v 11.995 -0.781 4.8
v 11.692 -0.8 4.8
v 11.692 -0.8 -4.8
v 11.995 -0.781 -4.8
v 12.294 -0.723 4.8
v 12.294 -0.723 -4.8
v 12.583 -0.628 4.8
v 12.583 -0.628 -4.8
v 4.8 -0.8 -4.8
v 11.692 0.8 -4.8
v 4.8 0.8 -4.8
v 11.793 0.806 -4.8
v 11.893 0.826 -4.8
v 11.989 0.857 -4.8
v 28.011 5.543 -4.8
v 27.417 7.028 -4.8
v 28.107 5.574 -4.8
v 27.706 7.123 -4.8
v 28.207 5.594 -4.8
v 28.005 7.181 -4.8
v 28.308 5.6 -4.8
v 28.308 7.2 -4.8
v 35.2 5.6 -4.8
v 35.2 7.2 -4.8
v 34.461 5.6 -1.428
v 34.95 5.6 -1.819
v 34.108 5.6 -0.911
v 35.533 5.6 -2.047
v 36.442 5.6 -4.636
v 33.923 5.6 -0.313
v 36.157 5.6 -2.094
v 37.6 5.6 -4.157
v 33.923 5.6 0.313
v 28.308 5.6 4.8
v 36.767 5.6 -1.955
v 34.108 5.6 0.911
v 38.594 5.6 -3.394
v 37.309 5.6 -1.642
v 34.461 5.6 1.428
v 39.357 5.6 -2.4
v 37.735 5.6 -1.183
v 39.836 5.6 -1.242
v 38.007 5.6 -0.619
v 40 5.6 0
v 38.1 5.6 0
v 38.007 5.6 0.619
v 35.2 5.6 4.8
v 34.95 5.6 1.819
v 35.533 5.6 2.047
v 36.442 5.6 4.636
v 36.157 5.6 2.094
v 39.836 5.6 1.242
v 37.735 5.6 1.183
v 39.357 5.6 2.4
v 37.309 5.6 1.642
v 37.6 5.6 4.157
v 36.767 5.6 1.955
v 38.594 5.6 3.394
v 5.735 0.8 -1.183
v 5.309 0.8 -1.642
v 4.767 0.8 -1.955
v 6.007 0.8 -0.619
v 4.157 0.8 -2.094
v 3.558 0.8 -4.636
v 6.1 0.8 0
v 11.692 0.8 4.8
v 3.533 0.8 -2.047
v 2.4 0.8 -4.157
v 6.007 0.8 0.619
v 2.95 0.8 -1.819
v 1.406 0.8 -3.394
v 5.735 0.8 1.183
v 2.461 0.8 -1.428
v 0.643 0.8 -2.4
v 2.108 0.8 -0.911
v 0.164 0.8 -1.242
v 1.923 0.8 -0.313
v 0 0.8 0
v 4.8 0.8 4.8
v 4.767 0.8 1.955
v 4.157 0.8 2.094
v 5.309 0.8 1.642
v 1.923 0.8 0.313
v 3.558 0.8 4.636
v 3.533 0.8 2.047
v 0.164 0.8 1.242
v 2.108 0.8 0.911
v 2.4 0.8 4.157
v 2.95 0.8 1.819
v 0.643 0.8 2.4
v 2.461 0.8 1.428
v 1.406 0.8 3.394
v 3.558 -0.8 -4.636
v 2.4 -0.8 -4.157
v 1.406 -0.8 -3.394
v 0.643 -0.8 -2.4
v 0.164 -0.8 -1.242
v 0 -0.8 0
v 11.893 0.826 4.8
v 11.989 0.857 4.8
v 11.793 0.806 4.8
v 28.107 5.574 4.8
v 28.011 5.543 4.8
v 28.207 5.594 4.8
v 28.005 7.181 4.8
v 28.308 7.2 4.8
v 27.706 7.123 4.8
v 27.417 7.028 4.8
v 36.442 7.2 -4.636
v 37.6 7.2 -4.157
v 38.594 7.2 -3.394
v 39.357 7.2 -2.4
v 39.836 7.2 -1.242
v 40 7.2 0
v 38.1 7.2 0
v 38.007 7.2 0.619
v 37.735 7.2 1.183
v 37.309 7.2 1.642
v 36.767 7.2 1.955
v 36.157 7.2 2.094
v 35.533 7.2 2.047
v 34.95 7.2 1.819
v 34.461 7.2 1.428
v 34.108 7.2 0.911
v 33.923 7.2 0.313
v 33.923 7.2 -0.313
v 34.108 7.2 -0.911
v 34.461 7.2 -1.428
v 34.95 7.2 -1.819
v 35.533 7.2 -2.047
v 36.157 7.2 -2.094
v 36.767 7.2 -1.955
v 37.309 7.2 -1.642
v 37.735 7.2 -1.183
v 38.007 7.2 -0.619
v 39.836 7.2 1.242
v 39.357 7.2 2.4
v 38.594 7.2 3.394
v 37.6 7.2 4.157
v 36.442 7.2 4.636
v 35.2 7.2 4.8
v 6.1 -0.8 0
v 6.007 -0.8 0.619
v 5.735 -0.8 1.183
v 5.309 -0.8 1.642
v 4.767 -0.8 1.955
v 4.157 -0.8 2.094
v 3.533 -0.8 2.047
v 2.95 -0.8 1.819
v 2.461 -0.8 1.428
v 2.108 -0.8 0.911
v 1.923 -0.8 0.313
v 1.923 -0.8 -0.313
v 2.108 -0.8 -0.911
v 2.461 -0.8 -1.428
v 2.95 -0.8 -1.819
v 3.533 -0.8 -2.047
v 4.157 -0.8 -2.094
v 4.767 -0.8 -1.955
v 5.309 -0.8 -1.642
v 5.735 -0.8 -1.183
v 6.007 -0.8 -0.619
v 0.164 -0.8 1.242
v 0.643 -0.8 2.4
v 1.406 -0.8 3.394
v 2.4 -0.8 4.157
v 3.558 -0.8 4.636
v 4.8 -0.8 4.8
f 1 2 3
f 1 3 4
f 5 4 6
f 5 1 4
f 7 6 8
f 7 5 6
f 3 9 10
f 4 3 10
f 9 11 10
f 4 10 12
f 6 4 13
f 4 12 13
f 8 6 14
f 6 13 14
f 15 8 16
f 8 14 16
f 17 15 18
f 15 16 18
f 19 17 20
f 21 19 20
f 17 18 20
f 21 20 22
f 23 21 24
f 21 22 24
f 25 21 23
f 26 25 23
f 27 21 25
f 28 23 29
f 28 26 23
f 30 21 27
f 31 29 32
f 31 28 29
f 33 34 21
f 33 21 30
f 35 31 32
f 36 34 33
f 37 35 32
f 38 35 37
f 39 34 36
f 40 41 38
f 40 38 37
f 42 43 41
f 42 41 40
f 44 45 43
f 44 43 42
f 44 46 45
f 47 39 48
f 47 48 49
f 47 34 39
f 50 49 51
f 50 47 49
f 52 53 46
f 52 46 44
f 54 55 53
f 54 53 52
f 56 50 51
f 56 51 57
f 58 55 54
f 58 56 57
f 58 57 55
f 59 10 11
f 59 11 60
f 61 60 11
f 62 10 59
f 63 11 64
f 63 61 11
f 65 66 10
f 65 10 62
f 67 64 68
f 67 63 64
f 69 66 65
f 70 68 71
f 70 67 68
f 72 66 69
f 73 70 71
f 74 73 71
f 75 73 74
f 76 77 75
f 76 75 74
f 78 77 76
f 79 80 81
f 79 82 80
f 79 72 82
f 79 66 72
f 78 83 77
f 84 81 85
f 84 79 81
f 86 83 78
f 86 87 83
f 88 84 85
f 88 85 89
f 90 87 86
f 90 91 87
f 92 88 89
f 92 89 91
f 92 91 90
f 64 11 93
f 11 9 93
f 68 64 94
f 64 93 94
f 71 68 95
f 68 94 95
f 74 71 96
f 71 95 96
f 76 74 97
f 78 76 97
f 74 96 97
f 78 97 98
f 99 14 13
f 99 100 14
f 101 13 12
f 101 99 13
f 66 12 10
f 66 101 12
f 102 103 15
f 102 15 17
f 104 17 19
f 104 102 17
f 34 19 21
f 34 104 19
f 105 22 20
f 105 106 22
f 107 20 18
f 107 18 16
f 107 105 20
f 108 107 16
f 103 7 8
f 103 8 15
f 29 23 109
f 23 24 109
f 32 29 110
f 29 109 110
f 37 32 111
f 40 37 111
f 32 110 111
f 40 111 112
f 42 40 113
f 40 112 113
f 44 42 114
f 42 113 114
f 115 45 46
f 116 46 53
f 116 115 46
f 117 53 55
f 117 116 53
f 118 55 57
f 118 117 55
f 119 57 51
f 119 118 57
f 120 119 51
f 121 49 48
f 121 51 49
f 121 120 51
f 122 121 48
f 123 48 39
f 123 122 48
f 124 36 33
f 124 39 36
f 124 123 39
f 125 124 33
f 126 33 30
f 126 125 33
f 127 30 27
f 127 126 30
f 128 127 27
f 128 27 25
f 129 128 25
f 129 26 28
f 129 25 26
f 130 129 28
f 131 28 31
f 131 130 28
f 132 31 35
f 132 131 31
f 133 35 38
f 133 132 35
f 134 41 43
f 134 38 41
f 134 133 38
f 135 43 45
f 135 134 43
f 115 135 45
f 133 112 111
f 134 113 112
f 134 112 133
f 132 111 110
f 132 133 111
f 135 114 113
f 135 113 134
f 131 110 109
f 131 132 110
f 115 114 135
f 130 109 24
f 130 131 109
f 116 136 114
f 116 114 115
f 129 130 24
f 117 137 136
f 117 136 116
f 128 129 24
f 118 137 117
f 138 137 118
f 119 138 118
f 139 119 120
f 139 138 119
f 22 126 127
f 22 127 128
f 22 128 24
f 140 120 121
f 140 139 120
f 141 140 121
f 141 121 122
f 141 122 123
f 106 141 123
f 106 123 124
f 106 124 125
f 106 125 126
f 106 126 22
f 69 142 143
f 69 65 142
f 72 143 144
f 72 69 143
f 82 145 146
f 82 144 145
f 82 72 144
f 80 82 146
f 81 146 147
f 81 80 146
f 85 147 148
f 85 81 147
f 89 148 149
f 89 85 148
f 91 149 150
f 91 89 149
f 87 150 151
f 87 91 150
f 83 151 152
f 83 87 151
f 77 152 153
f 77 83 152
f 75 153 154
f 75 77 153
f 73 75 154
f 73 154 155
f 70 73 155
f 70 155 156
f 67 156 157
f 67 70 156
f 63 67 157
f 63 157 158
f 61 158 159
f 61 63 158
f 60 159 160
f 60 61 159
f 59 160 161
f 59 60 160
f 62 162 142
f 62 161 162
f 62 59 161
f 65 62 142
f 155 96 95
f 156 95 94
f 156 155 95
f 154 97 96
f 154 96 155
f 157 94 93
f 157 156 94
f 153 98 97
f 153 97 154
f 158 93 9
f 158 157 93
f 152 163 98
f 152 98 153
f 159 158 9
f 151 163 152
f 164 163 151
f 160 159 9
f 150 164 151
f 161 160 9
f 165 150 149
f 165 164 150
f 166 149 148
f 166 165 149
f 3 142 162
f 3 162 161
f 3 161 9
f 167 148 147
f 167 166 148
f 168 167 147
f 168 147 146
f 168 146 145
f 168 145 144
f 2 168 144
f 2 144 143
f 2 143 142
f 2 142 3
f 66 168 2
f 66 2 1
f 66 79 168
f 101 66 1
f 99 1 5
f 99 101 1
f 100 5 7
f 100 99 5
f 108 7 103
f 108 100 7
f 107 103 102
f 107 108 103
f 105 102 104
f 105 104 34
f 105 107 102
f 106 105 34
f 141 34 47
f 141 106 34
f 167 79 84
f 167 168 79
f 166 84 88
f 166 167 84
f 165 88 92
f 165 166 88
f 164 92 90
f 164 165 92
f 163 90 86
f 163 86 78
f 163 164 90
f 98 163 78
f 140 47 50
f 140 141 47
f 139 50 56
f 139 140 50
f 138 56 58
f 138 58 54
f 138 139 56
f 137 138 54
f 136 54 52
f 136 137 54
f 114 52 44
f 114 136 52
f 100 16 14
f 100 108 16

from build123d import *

# Parameters (mm, degrees)
EXTRUDE_THIN1_DEPTH = 4.8
SKETCH2_R           = 2.1
CUT_EXTRUDE1_DEPTH  = 41.792156109
SKETCH3_R           = 2.1
CUT_EXTRUDE2_DEPTH  = 42.07359249
FILLET1_R           = 4.8


with BuildPart() as part:
    # Sketch1 → Extrude-Thin1 (new body)
    with BuildSketch(Plane.XY):
        with BuildLine():
            Line((0, -0.8), (11.691868154, -0.8))
            ThreePointArc((11.691868154, -0.8), (12.145726205, -0.756695328), (12.583205778, -0.628344058))
            Line((12.583205778, -0.628344058), (28.011019305, 5.542781353))
            ThreePointArc((28.011019305, 5.542781353), (28.156845829, 5.585565109), (28.308131846, 5.6))
            Line((28.308131846, 5.6), (40, 5.6))
            Line((40, 5.6), (40, 7.2))
            Line((40, 7.2), (28.308131846, 7.2))
            ThreePointArc((28.308131846, 7.2), (27.854273795, 7.156695328), (27.416794222, 7.028344058))
            Line((27.416794222, 7.028344058), (11.988980695, 0.857218647))
            ThreePointArc((11.988980695, 0.857218647), (11.843154171, 0.814434891), (11.691868154, 0.8))
            Line((11.691868154, 0.8), (0, 0.8))
            Line((0, 0.8), (0, -0.8))
        make_face()
    extrude(amount=EXTRUDE_THIN1_DEPTH)

    # Sketch2 → Cut-Extrude1 (cut, through all)
    with BuildSketch(Plane(origin=(0, 0.8, 0), x_dir=(1, 0, 0), z_dir=(0, 1, 0))):
        with Locations((4, 0)):
            Circle(SKETCH2_R)
    extrude(amount=-CUT_EXTRUDE1_DEPTH, mode=Mode.SUBTRACT)

    # Sketch3 → Cut-Extrude2 (cut, through all)
    with BuildSketch(Plane(origin=(0, 7.2, 0), x_dir=(1, 0, 0), z_dir=(0, 1, 0))):
        with Locations((36, 0)):
            Circle(SKETCH3_R)
    extrude(amount=-CUT_EXTRUDE2_DEPTH, mode=Mode.SUBTRACT)

    # Fillet1
    fillet1_edges = [part.edges().sort_by_distance(p)[0] for p in [
        (0, 0, 4.8),
        (40, 6.4, 4.8),
    ]]
    fillet(fillet1_edges, radius=FILLET1_R - 0.0001)  # a hair under: the kernel refuses the full size

    # Mirror1: part across plane


with BuildPart() as part_1:
    add(part.part)
    add(part.part.mirror(Plane(origin=(28.308131846, 4.8, 0), x_dir=(1, 0, 0), z_dir=(0, 0, 1))))


solid = part_1.part
